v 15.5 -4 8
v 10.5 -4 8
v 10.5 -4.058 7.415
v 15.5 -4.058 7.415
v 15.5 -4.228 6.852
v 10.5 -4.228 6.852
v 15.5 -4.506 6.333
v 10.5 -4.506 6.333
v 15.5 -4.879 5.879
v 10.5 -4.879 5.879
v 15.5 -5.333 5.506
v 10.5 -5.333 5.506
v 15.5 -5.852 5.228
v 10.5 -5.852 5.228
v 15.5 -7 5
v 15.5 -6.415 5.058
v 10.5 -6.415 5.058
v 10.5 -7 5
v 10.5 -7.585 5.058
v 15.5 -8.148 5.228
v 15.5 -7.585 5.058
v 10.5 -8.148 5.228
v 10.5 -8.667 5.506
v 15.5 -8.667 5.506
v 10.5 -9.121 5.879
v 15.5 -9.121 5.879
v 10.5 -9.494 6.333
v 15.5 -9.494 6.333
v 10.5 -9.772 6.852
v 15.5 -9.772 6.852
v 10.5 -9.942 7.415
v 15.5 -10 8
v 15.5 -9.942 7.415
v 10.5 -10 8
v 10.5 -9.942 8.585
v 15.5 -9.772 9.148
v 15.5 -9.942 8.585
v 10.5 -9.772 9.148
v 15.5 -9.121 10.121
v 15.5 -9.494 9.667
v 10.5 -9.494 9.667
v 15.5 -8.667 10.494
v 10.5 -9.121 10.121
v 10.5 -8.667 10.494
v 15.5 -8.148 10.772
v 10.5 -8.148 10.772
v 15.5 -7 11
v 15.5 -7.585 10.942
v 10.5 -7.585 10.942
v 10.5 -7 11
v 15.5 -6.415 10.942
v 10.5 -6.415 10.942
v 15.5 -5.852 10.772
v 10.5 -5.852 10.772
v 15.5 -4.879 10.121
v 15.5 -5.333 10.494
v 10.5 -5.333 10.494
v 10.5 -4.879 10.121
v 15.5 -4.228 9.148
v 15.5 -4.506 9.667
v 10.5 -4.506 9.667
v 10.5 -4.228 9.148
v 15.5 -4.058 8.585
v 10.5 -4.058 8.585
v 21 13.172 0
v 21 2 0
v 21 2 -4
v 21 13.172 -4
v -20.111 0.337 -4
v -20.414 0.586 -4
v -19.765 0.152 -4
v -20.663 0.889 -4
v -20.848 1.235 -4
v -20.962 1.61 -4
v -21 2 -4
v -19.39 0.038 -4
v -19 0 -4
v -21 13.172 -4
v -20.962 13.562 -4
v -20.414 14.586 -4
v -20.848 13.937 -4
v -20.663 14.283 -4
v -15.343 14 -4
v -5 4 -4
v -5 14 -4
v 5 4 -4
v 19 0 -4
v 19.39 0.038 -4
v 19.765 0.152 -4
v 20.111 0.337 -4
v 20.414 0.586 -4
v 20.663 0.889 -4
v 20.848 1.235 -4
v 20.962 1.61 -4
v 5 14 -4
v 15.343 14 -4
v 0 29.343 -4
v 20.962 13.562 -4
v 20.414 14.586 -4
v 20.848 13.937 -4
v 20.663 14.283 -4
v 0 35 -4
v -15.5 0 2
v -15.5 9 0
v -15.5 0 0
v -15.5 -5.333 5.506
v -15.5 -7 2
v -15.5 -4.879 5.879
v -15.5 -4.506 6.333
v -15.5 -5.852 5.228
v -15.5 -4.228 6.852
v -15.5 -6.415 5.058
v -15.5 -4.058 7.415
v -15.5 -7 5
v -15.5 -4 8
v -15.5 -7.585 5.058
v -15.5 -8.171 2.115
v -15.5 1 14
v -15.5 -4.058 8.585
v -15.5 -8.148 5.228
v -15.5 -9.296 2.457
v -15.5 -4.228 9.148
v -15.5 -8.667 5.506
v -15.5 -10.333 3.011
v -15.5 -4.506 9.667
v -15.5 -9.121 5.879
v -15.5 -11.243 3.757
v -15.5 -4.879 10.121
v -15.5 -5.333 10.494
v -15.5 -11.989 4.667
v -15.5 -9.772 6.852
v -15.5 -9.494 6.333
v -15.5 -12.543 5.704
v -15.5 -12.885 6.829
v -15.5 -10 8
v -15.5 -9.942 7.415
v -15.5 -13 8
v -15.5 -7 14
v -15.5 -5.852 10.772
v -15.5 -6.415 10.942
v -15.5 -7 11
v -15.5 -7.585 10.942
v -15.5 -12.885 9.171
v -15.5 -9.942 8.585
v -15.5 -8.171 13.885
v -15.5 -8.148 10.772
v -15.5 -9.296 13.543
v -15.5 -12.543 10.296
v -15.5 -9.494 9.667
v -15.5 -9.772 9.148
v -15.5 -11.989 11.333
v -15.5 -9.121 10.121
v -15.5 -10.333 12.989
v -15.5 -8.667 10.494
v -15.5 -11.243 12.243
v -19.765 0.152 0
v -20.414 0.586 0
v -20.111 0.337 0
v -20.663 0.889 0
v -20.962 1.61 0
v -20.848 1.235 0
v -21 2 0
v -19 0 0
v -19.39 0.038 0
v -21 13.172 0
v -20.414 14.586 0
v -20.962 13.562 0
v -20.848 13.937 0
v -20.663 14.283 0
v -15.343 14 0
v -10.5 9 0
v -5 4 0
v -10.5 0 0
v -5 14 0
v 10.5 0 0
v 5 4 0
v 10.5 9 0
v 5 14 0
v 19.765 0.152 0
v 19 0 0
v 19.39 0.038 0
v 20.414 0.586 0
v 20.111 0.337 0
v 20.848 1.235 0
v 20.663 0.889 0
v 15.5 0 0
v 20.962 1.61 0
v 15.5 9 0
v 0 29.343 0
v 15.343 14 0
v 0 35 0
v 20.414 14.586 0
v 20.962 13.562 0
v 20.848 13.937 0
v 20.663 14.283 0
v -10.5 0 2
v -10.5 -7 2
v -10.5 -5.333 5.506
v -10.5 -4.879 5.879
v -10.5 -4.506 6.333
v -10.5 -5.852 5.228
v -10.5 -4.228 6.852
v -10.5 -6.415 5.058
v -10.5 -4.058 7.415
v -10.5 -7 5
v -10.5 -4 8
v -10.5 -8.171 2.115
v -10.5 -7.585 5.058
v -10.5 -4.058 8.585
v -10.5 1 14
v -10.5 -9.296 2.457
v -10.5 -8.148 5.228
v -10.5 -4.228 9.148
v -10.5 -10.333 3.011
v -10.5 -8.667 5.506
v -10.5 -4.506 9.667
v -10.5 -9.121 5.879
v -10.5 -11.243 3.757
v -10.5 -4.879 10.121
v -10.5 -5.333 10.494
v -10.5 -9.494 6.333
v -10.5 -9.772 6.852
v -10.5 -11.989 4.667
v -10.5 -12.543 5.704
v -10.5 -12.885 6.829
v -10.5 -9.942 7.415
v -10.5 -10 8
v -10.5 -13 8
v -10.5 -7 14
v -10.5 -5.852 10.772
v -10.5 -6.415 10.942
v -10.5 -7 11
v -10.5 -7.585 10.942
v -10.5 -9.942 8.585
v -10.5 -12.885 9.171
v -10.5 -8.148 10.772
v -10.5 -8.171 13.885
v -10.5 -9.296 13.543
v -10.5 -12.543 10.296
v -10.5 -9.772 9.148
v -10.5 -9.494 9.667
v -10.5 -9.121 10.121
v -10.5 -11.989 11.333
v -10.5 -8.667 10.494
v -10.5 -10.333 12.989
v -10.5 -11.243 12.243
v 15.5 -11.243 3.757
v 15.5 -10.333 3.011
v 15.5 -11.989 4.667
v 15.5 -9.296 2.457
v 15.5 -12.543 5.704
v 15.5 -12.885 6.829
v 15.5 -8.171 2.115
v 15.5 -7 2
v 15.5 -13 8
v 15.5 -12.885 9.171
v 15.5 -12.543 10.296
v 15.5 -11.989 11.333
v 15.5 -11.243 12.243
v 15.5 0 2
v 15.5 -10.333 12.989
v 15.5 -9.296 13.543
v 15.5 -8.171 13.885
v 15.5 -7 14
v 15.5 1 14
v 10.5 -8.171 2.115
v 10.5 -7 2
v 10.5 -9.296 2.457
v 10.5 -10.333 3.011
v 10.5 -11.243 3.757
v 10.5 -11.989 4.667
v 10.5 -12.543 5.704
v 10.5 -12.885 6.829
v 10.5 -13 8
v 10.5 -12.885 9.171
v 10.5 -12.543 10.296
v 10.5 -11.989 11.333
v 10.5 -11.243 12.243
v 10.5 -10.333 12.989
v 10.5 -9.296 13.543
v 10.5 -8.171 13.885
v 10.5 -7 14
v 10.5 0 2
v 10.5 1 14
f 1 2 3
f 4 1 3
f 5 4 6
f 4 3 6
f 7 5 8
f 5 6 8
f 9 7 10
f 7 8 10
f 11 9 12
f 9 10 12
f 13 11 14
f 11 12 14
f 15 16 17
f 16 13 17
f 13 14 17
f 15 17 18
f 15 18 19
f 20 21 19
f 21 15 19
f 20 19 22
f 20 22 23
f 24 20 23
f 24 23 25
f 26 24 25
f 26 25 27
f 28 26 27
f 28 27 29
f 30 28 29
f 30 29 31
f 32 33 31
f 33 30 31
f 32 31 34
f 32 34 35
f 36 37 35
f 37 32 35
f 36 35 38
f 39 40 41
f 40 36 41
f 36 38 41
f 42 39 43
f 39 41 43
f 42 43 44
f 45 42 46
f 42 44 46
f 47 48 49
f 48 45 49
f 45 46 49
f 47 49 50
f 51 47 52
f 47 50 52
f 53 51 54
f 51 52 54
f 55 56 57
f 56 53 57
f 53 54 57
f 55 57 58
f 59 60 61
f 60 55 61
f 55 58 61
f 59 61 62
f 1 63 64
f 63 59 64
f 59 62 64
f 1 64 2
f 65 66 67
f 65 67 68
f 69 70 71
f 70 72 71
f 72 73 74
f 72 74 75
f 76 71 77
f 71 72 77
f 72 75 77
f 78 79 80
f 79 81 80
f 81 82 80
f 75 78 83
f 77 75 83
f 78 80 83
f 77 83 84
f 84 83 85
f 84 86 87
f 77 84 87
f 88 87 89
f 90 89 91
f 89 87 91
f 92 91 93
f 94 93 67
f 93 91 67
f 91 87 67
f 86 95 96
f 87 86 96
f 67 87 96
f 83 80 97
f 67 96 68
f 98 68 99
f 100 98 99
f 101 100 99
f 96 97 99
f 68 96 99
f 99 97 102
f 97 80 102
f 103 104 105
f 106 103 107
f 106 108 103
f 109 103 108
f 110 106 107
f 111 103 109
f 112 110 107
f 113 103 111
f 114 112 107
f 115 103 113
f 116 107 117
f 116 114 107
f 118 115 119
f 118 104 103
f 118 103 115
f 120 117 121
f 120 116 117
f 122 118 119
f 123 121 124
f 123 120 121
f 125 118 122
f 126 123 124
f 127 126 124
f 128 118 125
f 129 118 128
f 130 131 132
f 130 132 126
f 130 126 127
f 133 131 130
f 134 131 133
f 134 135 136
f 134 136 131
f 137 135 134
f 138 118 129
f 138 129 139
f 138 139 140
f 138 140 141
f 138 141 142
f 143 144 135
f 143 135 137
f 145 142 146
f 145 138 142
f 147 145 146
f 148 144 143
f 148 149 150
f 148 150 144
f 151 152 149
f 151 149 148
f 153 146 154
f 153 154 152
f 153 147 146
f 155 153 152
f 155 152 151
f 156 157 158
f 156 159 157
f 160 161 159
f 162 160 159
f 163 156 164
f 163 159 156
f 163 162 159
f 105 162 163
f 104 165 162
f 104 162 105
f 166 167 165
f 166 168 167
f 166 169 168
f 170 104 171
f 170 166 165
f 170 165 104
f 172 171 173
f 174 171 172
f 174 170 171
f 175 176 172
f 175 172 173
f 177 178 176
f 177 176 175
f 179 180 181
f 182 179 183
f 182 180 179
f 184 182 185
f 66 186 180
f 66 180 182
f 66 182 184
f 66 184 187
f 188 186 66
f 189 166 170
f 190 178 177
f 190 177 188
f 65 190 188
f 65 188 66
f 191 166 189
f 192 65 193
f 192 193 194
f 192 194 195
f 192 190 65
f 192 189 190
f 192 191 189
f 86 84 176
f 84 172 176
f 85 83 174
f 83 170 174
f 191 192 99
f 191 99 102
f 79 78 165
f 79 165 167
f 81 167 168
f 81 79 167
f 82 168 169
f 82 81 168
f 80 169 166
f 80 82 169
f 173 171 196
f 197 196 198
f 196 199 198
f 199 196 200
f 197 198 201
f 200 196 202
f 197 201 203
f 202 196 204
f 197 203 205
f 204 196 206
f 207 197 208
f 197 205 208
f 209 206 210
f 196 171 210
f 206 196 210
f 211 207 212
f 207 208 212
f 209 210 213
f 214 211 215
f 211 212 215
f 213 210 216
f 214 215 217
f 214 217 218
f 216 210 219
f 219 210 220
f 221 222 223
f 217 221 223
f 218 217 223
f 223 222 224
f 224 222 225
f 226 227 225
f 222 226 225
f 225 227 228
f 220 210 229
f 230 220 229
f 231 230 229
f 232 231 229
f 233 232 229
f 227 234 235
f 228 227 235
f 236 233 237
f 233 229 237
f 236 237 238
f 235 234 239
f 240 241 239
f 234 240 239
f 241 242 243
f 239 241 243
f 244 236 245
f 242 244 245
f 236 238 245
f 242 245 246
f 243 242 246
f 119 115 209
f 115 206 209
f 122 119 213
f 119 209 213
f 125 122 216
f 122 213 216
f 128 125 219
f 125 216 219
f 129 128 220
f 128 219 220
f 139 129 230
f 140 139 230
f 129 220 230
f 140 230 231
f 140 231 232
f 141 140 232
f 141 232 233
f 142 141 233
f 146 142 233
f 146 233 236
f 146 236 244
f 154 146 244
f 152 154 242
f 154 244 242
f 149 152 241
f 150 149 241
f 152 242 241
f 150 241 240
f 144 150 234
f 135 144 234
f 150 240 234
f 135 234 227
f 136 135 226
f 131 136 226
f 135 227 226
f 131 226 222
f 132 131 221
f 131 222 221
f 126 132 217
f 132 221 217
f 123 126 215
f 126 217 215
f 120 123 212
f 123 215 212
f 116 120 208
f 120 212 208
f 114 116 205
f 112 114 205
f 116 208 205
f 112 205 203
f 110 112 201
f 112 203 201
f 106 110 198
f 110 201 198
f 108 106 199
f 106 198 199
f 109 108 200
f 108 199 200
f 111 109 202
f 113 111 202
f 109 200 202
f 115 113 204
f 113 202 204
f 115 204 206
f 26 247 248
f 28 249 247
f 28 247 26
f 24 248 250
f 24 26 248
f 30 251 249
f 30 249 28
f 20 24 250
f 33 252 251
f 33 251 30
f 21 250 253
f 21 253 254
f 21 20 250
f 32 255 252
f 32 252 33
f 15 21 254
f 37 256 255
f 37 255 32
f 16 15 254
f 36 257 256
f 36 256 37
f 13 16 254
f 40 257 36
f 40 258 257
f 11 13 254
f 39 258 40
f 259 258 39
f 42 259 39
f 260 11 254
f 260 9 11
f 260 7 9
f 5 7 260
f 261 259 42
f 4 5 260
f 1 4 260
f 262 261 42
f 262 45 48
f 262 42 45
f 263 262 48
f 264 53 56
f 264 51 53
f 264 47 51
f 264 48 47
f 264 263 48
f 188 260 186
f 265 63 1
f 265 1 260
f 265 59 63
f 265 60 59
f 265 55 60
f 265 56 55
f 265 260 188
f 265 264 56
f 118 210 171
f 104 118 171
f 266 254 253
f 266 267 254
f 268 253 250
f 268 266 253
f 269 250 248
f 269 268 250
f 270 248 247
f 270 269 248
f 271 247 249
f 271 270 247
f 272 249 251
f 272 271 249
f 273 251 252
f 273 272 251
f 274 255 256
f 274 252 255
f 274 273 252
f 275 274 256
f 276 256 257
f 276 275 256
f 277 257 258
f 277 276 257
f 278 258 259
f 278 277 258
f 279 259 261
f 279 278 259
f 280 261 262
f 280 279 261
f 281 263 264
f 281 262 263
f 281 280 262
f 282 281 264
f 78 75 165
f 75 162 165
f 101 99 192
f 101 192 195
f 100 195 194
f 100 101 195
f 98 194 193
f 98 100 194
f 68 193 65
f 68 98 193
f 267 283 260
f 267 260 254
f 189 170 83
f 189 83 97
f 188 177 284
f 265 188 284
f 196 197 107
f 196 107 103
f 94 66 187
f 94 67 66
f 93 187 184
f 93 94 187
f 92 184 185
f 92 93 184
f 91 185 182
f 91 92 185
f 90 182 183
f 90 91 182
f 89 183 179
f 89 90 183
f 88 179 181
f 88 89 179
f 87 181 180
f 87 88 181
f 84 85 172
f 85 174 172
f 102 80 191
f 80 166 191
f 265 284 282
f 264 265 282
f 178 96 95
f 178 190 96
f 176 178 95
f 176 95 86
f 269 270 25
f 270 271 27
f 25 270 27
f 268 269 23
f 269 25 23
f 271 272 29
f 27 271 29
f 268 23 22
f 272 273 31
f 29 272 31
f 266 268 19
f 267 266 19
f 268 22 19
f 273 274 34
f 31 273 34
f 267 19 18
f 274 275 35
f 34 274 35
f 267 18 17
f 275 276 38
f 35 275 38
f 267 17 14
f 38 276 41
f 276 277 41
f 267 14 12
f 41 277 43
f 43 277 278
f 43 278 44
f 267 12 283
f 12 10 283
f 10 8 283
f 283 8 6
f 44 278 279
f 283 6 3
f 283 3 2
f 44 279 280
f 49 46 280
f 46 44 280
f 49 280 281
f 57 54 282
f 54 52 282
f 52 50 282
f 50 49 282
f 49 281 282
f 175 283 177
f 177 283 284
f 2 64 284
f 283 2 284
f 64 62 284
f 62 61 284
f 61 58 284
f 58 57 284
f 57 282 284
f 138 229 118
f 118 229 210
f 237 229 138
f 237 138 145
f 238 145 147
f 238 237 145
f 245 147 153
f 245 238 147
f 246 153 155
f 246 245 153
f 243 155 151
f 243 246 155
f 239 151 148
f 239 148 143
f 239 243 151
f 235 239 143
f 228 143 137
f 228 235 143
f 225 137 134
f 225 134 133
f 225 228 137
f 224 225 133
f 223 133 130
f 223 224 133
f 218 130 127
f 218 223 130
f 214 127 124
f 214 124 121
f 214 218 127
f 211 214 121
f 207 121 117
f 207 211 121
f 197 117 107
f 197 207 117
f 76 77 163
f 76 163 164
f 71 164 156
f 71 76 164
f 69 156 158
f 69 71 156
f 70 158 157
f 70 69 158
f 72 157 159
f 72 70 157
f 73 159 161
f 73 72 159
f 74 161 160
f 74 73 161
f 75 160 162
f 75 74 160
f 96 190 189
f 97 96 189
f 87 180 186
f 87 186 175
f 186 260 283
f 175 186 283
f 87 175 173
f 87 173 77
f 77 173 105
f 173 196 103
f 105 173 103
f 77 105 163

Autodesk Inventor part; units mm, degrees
ref_plane "XZ Plane" through (0, 0, 0) normal (0, 1, 0) x (-1, 0, 0)
ref_plane "XY Plane" through (0, 0, 0) normal (0, 0, 1) x (1, 0, 0)
sketch "스케치1" plane through (0, 0, 0) normal (0, 0, 1) x (1, 0, 0)
  line L0 (0, 0) -> (0, 40)
  line L1 (0, 0) -> (40, 0) construction
  line L2 (0, 0) -> (-21, 0)
  line L3 (-15.3431, 14) -> (-5, 14)
  line L4 (-5, 14) -> (-5, 4)
  line L5 (-5, 4) -> (0, 4)
  line L6 (-21, 0) -> (-21, 14)
  line L7 (-21, 14) -> (0, 35)
  line L8 (-15.3431, 14) -> (0, 29.3431)
  line L9 (0, 0) -> (21, 0)
  line L10 (15.3431, 14) -> (5, 14)
  line L11 (5, 14) -> (5, 4)
  line L12 (5, 4) -> (0, 4)
  line L13 (21, 0) -> (21, 14)
  line L14 (21, 14) -> (0, 35)
  line L15 (15.3431, 14) -> (0, 29.3431)
  dimension "d0" = 40
  dimension "d2" = 35
  dimension "d3" = 4
  dimension "d4" = 10
  dimension "d6" = 42
  dimension "d8" = 4
  dimension "d9" = 10
  dimension "d10" = 45
extrude "돌출1" add sketch "스케치1" against normal blind 4 contours L2 L6 L7 L0 L8 L3 L4 L5 | L0 L12 L11 L10 L15 L14 L13 L9
ref_plane "작업 평면1" through (10.5, 0, 0) normal (1, 0, 0) x (0, 1, 0)
sketch "스케치3" plane through (10.5, 0, 0) normal (1, 0, 0) x (0, 1, 0)
  circle A0 centre (-7, 8) radius 3
  arc A1 (-7, 14) -> (-7, 2) centre (-7, 8) ccw
  line L0 (14, 0) -> (0, 0) projected
  line L1 (9, 0) -> (1, 14)
  line L2 (1, 14) -> (-7, 14)
  line L3 (0, 0) -> (0, -4) projected
  line L4 (0, 0) -> (0, 2)
  line L5 (0, 2) -> (-7, 2)
  dimension "d14" = 6
  dimension "d15" = 12
  dimension "d16" = 8
  dimension "d17" = 8
  dimension "d18" = 6
  dimension "d19" = 12
  dimension "d20" = 14
  dimension "d21" = 7
extrude "돌출2" add sketch "스케치3" along normal blind 5
mirror "미러1" about plane through (0, 0, 0) normal (1, 0, 0) of "돌출2"
fillet "모깎기1" radius 2 4 edges at (-21, 14, -2) (-21, 0, -2) (21, 14, -2) (21, 0, -2)
properties part number "01-1"
